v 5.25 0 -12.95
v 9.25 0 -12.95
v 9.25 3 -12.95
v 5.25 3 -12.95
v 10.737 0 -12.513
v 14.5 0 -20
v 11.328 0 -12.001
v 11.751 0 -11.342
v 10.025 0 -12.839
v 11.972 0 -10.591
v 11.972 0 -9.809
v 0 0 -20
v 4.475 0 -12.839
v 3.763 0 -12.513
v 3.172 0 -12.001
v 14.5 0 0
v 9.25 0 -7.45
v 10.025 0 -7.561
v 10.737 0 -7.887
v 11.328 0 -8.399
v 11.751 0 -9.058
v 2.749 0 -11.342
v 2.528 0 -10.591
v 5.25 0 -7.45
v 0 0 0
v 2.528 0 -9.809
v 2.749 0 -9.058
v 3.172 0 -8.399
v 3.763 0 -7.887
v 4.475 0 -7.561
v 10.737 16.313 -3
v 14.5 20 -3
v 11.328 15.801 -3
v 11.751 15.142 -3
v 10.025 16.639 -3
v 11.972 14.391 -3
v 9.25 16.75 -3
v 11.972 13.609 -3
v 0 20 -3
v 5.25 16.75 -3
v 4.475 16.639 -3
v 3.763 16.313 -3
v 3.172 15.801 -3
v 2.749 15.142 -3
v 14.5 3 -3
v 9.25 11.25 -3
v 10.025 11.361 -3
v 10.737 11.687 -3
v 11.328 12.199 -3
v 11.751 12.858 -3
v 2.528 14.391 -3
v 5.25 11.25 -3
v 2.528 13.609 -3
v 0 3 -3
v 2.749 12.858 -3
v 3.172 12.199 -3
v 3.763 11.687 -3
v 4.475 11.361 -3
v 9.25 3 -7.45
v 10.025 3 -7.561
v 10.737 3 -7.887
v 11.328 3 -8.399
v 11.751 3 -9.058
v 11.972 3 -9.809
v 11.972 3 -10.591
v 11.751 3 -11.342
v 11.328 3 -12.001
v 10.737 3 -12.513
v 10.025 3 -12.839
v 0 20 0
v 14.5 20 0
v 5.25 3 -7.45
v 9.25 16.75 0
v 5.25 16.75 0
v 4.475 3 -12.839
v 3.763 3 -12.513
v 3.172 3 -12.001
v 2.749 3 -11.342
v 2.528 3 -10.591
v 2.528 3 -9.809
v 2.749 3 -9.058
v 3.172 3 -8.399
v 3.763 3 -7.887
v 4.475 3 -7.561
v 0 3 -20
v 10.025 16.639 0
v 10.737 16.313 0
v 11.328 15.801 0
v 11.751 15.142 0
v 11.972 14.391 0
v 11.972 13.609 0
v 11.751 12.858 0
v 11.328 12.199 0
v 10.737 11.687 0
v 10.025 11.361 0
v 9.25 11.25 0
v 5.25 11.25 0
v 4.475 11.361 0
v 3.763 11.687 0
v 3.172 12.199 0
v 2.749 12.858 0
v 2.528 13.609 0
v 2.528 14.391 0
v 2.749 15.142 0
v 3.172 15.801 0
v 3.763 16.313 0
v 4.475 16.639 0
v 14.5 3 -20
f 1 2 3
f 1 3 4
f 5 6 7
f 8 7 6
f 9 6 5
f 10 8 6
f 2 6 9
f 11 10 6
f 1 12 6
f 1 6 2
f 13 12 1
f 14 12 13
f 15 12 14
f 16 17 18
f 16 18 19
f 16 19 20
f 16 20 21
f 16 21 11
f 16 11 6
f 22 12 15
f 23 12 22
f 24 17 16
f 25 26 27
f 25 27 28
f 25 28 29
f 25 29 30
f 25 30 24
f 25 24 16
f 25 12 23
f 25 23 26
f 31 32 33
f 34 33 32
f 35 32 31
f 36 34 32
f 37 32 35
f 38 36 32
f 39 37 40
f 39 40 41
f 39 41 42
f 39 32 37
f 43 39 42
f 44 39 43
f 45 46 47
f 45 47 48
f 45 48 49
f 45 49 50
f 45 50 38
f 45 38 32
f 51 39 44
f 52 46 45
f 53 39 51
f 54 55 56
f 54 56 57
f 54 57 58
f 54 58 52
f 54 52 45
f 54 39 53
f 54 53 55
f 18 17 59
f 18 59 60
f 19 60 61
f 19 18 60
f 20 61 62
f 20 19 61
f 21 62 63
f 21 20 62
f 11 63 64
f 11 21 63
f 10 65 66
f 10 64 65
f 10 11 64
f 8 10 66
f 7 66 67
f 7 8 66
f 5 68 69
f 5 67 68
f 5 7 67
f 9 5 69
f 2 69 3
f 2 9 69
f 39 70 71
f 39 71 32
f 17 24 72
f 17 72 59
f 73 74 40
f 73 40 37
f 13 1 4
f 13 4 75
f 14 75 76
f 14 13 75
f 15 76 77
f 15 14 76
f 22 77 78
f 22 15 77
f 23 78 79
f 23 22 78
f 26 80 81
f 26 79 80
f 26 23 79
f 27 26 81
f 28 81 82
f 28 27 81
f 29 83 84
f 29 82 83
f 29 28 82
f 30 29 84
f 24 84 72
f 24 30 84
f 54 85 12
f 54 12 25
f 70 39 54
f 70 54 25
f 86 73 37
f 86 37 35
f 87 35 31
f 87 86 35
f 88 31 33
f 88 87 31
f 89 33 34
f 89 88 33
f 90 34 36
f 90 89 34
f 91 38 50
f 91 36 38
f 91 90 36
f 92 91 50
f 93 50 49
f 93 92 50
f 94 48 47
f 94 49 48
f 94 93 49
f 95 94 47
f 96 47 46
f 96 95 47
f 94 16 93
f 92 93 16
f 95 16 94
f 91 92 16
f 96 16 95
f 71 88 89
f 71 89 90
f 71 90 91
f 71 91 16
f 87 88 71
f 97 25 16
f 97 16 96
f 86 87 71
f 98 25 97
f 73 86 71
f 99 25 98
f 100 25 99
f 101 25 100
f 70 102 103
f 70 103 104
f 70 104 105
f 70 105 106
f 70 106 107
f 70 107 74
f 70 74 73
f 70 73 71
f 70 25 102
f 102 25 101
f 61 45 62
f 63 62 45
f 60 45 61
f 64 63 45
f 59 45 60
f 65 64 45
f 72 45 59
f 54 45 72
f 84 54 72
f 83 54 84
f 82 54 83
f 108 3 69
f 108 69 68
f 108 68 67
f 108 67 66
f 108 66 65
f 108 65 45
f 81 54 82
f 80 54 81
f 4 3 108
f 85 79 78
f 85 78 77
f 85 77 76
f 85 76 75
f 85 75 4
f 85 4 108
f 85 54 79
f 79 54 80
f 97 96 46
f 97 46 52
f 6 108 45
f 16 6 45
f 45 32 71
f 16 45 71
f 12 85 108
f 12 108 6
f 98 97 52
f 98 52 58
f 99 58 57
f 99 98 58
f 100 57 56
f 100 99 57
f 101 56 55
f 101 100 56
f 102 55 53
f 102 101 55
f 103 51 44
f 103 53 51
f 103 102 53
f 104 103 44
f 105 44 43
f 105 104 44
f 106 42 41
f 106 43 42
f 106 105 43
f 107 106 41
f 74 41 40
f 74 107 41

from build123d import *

# Parameters (mm, degrees)
BOSS_EXTRUDE1_DEPTH = 14.5
CUT_EXTRUDE1_DEPTH  = 21
CUT_EXTRUDE2_DEPTH  = 21


with BuildPart() as part:
    # Sketch1 → Boss-Extrude1 (new body)
    with BuildSketch(Plane(origin=(0, 0, 0), x_dir=(0, 0, -1), z_dir=(1, 0, 0))):
        Polygon((0, 0), (0, 20), (3, 20), (3, 3), (20, 3), (20, 0), align=None)
    extrude(amount=BOSS_EXTRUDE1_DEPTH)

    # Sketch2 → Cut-Extrude1 (cut, through all)
    with BuildSketch(Plane.XY):
        with BuildLine():
            Line((5.25, 16.75), (9.25, 16.75))
            ThreePointArc((9.25, 16.75), (12, 14), (9.25, 11.25))
            Line((9.25, 11.25), (5.25, 11.25))
            ThreePointArc((5.25, 11.25), (2.5, 14), (5.25, 16.75))
        make_face()
    extrude(amount=-CUT_EXTRUDE1_DEPTH, mode=Mode.SUBTRACT)

    # Sketch3 → Cut-Extrude2 (cut, through all)
    with BuildSketch(Plane.XZ):
        with BuildLine():
            Line((5.25, -7.45), (9.25, -7.45))
            ThreePointArc((9.25, -7.45), (12, -10.2), (9.25, -12.95))
            Line((9.25, -12.95), (5.25, -12.95))
            ThreePointArc((5.25, -12.95), (2.5, -10.2), (5.25, -7.45))
        make_face()
    extrude(amount=-CUT_EXTRUDE2_DEPTH, mode=Mode.SUBTRACT)


solid = part.part
